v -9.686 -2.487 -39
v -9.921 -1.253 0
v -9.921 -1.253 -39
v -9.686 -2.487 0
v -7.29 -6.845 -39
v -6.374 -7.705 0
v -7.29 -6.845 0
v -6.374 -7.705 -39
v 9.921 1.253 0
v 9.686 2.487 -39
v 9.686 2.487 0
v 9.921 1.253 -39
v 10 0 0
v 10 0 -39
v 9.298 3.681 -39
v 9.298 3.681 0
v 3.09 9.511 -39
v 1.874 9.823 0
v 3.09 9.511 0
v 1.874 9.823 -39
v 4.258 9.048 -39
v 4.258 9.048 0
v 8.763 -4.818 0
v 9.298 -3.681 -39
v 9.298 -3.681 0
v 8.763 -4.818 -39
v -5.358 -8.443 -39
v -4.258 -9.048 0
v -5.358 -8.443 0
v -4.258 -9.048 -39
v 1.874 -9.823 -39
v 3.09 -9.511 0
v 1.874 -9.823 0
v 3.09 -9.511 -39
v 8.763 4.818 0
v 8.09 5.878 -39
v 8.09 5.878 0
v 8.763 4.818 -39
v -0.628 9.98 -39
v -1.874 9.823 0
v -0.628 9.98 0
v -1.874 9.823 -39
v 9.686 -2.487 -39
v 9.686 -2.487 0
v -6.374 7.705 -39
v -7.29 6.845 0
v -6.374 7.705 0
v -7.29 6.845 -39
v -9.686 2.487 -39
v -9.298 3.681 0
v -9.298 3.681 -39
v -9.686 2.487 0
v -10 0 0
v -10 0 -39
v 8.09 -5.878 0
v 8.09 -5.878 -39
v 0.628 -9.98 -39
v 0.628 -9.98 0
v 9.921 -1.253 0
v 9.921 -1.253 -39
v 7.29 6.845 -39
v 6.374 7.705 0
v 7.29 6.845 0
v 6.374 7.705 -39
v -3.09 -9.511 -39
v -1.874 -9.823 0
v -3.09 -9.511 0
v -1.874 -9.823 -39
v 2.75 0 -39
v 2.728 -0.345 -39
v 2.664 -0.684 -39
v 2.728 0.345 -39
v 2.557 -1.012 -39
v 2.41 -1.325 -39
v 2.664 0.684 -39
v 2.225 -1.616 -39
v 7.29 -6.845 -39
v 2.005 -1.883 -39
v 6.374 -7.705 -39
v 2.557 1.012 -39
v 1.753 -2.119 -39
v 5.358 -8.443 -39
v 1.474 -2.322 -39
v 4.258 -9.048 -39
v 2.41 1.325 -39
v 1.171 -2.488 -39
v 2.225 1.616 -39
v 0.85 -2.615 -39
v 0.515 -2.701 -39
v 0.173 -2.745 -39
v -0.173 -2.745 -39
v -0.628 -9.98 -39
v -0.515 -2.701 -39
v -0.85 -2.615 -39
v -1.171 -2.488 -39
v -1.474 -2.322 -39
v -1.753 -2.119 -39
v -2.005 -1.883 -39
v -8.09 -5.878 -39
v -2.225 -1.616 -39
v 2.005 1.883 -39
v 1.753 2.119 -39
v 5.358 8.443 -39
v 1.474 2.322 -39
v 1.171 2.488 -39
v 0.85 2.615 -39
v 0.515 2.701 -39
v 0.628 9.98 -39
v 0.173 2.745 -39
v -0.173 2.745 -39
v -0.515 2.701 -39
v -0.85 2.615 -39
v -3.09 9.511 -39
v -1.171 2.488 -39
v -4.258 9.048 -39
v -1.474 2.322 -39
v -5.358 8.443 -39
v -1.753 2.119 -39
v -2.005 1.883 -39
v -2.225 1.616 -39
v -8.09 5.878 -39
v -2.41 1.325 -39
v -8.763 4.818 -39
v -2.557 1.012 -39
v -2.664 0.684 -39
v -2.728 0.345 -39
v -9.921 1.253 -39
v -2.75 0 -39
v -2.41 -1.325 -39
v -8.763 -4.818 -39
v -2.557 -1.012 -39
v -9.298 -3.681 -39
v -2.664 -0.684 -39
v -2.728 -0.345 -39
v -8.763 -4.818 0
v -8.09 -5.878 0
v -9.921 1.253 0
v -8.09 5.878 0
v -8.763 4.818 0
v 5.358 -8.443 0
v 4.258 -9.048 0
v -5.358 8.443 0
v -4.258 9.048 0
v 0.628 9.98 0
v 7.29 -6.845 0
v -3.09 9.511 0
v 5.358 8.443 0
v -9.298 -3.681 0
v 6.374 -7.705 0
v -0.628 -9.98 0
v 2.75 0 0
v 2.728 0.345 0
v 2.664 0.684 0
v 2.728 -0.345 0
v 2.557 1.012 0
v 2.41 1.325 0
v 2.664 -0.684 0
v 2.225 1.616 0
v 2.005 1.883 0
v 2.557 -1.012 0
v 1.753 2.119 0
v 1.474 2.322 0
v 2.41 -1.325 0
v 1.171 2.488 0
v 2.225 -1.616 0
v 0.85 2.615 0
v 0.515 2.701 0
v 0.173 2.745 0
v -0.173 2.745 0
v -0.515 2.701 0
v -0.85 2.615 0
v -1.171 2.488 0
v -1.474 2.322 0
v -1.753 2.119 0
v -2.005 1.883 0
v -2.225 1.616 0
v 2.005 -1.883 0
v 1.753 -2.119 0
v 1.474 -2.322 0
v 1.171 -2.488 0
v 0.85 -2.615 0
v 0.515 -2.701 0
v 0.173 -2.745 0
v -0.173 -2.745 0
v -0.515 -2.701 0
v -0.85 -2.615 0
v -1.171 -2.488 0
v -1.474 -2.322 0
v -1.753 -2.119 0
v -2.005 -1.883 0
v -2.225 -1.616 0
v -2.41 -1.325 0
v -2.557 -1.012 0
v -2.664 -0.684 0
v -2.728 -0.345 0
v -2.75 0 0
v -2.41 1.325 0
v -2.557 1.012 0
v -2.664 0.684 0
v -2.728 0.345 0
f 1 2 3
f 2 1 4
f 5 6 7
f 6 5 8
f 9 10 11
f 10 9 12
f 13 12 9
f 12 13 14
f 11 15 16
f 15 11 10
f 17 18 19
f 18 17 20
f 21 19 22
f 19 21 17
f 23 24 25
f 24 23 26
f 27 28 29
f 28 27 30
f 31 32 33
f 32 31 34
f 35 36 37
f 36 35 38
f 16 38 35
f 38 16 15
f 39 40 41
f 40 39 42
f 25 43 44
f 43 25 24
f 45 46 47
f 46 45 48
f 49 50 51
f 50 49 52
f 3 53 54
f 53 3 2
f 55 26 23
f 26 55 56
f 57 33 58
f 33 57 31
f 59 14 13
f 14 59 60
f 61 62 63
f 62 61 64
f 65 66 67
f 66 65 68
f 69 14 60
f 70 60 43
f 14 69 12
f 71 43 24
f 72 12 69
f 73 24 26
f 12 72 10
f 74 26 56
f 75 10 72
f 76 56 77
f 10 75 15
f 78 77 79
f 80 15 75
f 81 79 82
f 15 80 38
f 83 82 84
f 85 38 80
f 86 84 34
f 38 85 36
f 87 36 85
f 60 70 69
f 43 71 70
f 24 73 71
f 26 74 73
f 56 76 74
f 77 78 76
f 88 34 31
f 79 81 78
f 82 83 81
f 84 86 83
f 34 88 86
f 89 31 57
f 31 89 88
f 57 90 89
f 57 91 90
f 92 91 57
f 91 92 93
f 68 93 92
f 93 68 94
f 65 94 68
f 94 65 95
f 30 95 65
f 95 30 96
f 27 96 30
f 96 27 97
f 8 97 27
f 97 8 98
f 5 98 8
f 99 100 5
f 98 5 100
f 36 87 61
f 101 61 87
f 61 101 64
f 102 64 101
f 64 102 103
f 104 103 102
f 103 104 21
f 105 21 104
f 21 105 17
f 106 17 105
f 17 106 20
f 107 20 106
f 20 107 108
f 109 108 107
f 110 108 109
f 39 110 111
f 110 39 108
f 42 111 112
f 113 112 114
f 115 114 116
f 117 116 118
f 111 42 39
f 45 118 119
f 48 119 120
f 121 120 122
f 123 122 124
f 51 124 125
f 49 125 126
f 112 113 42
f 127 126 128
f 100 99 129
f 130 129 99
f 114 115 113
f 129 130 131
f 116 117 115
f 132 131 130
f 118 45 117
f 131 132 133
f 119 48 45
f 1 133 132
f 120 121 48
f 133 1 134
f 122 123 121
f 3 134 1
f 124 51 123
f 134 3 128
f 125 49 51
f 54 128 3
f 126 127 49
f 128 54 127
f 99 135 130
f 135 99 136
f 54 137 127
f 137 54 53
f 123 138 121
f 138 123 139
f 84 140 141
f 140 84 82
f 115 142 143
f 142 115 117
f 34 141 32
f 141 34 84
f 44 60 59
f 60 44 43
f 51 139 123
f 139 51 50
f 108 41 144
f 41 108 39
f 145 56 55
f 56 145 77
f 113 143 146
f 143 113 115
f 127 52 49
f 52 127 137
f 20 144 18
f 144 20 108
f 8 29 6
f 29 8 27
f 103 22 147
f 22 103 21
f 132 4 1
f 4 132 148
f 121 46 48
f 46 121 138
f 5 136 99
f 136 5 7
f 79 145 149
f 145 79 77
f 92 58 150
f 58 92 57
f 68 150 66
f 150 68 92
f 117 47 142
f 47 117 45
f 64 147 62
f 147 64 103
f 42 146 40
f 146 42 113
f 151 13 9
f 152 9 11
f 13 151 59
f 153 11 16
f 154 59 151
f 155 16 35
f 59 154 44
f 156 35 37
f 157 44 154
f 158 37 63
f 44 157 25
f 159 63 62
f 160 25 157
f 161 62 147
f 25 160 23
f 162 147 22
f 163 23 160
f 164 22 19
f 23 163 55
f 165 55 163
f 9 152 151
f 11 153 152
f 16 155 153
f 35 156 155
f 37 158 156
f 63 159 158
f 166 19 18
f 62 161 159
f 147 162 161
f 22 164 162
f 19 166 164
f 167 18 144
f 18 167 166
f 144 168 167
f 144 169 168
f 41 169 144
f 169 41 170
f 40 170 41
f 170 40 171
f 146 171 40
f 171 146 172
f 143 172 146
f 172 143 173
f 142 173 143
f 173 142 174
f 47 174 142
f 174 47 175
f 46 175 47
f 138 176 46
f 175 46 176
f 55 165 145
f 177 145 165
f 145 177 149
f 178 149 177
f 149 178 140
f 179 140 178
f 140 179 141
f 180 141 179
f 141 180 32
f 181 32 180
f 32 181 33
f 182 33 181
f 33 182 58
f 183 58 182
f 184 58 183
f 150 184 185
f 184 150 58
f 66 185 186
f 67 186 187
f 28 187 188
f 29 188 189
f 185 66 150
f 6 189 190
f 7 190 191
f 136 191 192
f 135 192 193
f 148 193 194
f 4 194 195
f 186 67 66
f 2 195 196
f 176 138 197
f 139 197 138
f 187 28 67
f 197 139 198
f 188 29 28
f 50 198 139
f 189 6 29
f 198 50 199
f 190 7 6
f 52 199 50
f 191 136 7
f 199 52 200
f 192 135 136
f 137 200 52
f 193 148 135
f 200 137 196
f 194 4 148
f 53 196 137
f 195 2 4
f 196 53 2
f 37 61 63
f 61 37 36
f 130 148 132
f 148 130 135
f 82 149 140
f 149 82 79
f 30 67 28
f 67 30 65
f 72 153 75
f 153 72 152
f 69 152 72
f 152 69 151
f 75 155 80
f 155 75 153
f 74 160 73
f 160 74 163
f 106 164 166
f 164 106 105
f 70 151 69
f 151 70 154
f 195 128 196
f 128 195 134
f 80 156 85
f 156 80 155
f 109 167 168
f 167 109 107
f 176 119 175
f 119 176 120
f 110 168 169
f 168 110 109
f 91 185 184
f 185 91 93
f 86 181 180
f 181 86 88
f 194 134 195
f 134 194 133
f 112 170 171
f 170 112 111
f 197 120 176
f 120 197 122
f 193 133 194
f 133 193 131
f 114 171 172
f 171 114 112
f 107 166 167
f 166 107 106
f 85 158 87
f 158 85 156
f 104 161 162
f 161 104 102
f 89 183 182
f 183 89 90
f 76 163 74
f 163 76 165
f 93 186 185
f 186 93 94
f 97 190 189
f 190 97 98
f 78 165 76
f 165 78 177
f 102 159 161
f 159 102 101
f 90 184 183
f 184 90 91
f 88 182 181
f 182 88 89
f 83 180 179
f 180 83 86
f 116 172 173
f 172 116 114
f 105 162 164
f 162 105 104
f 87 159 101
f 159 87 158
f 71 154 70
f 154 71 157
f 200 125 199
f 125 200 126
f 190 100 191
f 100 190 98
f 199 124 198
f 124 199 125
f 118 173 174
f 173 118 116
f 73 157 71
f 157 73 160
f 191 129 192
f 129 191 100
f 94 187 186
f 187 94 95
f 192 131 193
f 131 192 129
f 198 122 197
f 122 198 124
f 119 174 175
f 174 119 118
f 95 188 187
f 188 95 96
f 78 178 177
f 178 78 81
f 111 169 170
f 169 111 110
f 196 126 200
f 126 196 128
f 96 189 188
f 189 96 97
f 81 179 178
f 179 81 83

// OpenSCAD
$fn = 50;


difference() {
	union() {
		translate(v = [0, 0, -39.0000000000]) {
			cylinder(h = 39, r = 10.0000000000);
		}
		cylinder(h = 0, r = 13.0000000000);
	}
	union() {
		#translate(v = [0, 0, -39]) {
			cylinder(h = 39, r = 2.7500000000);
		}
	}
}
